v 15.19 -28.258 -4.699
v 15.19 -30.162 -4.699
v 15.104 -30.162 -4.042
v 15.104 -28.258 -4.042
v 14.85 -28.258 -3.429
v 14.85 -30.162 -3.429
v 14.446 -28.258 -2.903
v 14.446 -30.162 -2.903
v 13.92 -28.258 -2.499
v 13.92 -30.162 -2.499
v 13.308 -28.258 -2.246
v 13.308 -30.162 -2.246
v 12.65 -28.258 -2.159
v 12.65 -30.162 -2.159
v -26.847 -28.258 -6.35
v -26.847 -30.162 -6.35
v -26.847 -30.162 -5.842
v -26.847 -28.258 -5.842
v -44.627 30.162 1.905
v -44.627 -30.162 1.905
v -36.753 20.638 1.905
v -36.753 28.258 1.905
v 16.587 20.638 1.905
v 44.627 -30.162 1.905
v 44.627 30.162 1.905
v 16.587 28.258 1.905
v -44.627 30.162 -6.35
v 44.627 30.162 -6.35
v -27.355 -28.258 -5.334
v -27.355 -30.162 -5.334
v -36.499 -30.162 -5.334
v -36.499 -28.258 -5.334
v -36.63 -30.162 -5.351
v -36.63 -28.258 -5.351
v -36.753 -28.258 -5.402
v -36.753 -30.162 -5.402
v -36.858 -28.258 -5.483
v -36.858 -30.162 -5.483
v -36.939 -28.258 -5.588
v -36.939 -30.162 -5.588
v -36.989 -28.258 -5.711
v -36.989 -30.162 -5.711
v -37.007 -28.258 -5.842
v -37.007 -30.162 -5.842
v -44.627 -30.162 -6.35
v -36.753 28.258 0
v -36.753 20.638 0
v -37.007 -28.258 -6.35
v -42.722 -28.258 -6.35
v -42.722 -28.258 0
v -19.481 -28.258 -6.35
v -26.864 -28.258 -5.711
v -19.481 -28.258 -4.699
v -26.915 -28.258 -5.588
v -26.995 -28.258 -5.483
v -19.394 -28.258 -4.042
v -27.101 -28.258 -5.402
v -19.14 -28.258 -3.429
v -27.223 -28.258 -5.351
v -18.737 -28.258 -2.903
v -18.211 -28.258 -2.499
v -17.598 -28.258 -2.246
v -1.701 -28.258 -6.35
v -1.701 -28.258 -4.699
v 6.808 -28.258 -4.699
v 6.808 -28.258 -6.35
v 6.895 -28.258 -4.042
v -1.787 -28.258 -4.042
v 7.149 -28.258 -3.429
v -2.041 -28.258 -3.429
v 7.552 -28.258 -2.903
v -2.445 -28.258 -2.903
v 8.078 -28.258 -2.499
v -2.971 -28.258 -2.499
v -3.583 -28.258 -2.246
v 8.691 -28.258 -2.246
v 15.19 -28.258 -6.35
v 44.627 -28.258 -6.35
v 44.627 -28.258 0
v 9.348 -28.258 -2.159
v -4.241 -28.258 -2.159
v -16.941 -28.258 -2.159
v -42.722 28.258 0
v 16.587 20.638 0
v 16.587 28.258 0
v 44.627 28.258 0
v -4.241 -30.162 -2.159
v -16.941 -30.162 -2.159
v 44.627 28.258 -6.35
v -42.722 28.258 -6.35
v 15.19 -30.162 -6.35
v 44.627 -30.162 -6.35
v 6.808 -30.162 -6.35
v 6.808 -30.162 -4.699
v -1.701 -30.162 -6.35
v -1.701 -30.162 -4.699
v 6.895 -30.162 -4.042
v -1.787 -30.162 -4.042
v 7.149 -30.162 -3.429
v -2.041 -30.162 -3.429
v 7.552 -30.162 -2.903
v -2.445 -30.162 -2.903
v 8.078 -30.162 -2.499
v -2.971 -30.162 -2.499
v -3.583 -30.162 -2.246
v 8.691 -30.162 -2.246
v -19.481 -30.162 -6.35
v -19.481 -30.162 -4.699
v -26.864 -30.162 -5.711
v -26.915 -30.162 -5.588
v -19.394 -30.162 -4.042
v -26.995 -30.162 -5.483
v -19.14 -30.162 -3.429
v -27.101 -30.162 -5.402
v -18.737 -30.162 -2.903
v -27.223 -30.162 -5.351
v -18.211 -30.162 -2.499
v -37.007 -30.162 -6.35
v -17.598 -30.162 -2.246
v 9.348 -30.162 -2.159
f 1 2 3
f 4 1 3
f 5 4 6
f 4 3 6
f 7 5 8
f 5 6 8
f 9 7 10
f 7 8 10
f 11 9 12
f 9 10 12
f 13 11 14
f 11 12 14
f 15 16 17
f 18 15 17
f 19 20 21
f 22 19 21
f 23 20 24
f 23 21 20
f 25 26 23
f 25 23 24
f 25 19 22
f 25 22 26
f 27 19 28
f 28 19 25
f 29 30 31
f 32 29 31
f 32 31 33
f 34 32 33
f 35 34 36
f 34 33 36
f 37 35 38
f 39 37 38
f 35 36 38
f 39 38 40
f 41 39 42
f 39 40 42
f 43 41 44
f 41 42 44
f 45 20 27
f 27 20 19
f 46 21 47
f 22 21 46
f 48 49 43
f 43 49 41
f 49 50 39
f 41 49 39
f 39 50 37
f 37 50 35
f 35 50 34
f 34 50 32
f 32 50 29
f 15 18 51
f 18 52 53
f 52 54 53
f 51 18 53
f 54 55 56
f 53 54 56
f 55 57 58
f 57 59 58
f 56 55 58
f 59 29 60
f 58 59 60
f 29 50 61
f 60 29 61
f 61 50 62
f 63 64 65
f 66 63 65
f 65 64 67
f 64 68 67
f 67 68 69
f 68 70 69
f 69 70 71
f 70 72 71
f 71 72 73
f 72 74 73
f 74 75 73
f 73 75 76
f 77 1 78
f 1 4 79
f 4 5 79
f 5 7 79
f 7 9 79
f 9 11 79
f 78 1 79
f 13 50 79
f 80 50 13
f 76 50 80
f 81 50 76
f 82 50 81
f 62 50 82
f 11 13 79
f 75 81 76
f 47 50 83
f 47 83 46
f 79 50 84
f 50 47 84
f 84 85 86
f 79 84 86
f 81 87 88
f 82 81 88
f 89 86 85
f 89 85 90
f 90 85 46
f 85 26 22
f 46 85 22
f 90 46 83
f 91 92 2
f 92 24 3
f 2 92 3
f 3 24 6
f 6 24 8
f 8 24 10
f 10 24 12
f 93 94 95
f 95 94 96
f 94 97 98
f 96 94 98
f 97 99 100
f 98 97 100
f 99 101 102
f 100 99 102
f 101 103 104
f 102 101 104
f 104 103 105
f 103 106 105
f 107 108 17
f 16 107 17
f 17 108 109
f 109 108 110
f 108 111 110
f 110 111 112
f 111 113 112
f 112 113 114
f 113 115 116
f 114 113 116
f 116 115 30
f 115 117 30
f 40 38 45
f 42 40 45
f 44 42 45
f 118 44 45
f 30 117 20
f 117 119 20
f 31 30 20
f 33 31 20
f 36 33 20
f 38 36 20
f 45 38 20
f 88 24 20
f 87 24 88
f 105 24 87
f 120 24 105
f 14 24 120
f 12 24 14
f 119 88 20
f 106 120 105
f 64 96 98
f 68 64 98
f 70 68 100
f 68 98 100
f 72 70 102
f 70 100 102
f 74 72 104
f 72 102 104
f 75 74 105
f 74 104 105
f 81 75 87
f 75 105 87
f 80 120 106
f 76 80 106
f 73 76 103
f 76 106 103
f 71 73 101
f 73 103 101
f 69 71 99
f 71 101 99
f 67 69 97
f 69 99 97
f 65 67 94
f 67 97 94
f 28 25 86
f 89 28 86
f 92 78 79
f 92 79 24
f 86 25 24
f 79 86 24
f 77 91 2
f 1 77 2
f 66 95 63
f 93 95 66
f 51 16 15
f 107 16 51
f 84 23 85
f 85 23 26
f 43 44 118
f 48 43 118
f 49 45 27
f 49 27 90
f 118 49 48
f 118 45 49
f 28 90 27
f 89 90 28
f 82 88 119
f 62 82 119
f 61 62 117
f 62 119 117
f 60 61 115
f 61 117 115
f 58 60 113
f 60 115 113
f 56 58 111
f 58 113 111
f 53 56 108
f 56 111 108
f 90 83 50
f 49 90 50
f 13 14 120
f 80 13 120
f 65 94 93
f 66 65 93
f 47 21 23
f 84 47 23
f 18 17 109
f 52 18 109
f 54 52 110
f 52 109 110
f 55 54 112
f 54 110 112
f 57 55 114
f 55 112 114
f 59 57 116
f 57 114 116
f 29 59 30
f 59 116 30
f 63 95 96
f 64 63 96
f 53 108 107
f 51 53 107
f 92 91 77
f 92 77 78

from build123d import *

# Parameters (mm, degrees)
F0_W     = 89.253187
F0_H     = 60.325
F1_DEPTH = 1.905
F3_DEPTH = 6.35
F5_DEPTH = 25.4
F6_W     = 53.34
F6_H     = 7.62
F7_DEPTH = 25.4


# Not quite as in the source:
# - a feature names something its author has since deleted; it is built from what else it names


with BuildPart() as f1:
    # F0 (on Top) → F1 (new body)
    with BuildSketch(Plane.XY):
        Rectangle(F0_W, F0_H)
    extrude(amount=F1_DEPTH)

    # F2 (on face) → F3 (join)
    with BuildSketch(Plane(origin=(0, 0, 0), x_dir=(1, 0, 0), z_dir=(0, 0, -1))):
        Polygon((-42.7215935, -28.2575), (-42.7215935, 28.2575), (44.6265935, 28.2575), (44.6265935, 30.1625), (-44.6265935, 30.1625), (-44.6265935, -30.1625), (44.6265935, -30.1625), (44.6265935, -28.2575), align=None)
    extrude(amount=F3_DEPTH)

    # F4 (on face) → F5 (cut)
    with BuildSketch(Plane.XZ.offset(30.1625)):
        with BuildLine():
            Line((-37.0065935, -5.842), (-37.0065935, -6.35))
            Line((-37.0065935, -6.35), (-26.8465935, -6.35))
            Line((-26.8465935, -6.35), (-26.8465935, -5.842))
            ThreePointArc((-26.8465935, -5.842), (-26.9953832552, -5.4827897552), (-27.3545935, -5.334))
            Line((-27.3545935, -5.334), (-36.4985935, -5.334))
            ThreePointArc((-36.4985935, -5.334), (-36.8578037448, -5.4827897552), (-37.0065935, -5.842))
        make_face()
        with BuildLine():
            Line((-19.4805935, -4.699), (-19.4805935, -6.35))
            Line((-19.4805935, -6.35), (-1.7005935, -6.35))
            Line((-1.7005935, -6.35), (-1.7005935, -4.699))
            ThreePointArc((-1.7005935, -4.699), (-2.4445422758, -2.9029487758), (-4.2405935, -2.159))
            Line((-4.2405935, -2.159), (-16.9405935, -2.159))
            ThreePointArc((-16.9405935, -2.159), (-18.7366447242, -2.9029487758), (-19.4805935, -4.699))
        make_face()
        with BuildLine():
            Line((6.8084065, -4.699), (6.8084065, -6.35))
            Line((6.8084065, -6.35), (15.1904065, -6.35))
            Line((15.1904065, -6.35), (15.1904065, -4.699))
            ThreePointArc((15.1904065, -4.699), (14.4464577242, -2.9029487758), (12.6504065, -2.159))
            Line((12.6504065, -2.159), (9.3484065, -2.159))
            ThreePointArc((9.3484065, -2.159), (7.5523552758, -2.9029487758), (6.8084065, -4.699))
        make_face()
    extrude(amount=-F5_DEPTH, mode=Mode.SUBTRACT)

    # F6 (on face) → F7 (cut)
    with BuildSketch(Plane.XY.offset(1.905)):
        with Locations((-10.0825935, 24.4475)):
            Rectangle(F6_W, F6_H)
    extrude(amount=-F7_DEPTH, mode=Mode.SUBTRACT)


solid = f1.part
